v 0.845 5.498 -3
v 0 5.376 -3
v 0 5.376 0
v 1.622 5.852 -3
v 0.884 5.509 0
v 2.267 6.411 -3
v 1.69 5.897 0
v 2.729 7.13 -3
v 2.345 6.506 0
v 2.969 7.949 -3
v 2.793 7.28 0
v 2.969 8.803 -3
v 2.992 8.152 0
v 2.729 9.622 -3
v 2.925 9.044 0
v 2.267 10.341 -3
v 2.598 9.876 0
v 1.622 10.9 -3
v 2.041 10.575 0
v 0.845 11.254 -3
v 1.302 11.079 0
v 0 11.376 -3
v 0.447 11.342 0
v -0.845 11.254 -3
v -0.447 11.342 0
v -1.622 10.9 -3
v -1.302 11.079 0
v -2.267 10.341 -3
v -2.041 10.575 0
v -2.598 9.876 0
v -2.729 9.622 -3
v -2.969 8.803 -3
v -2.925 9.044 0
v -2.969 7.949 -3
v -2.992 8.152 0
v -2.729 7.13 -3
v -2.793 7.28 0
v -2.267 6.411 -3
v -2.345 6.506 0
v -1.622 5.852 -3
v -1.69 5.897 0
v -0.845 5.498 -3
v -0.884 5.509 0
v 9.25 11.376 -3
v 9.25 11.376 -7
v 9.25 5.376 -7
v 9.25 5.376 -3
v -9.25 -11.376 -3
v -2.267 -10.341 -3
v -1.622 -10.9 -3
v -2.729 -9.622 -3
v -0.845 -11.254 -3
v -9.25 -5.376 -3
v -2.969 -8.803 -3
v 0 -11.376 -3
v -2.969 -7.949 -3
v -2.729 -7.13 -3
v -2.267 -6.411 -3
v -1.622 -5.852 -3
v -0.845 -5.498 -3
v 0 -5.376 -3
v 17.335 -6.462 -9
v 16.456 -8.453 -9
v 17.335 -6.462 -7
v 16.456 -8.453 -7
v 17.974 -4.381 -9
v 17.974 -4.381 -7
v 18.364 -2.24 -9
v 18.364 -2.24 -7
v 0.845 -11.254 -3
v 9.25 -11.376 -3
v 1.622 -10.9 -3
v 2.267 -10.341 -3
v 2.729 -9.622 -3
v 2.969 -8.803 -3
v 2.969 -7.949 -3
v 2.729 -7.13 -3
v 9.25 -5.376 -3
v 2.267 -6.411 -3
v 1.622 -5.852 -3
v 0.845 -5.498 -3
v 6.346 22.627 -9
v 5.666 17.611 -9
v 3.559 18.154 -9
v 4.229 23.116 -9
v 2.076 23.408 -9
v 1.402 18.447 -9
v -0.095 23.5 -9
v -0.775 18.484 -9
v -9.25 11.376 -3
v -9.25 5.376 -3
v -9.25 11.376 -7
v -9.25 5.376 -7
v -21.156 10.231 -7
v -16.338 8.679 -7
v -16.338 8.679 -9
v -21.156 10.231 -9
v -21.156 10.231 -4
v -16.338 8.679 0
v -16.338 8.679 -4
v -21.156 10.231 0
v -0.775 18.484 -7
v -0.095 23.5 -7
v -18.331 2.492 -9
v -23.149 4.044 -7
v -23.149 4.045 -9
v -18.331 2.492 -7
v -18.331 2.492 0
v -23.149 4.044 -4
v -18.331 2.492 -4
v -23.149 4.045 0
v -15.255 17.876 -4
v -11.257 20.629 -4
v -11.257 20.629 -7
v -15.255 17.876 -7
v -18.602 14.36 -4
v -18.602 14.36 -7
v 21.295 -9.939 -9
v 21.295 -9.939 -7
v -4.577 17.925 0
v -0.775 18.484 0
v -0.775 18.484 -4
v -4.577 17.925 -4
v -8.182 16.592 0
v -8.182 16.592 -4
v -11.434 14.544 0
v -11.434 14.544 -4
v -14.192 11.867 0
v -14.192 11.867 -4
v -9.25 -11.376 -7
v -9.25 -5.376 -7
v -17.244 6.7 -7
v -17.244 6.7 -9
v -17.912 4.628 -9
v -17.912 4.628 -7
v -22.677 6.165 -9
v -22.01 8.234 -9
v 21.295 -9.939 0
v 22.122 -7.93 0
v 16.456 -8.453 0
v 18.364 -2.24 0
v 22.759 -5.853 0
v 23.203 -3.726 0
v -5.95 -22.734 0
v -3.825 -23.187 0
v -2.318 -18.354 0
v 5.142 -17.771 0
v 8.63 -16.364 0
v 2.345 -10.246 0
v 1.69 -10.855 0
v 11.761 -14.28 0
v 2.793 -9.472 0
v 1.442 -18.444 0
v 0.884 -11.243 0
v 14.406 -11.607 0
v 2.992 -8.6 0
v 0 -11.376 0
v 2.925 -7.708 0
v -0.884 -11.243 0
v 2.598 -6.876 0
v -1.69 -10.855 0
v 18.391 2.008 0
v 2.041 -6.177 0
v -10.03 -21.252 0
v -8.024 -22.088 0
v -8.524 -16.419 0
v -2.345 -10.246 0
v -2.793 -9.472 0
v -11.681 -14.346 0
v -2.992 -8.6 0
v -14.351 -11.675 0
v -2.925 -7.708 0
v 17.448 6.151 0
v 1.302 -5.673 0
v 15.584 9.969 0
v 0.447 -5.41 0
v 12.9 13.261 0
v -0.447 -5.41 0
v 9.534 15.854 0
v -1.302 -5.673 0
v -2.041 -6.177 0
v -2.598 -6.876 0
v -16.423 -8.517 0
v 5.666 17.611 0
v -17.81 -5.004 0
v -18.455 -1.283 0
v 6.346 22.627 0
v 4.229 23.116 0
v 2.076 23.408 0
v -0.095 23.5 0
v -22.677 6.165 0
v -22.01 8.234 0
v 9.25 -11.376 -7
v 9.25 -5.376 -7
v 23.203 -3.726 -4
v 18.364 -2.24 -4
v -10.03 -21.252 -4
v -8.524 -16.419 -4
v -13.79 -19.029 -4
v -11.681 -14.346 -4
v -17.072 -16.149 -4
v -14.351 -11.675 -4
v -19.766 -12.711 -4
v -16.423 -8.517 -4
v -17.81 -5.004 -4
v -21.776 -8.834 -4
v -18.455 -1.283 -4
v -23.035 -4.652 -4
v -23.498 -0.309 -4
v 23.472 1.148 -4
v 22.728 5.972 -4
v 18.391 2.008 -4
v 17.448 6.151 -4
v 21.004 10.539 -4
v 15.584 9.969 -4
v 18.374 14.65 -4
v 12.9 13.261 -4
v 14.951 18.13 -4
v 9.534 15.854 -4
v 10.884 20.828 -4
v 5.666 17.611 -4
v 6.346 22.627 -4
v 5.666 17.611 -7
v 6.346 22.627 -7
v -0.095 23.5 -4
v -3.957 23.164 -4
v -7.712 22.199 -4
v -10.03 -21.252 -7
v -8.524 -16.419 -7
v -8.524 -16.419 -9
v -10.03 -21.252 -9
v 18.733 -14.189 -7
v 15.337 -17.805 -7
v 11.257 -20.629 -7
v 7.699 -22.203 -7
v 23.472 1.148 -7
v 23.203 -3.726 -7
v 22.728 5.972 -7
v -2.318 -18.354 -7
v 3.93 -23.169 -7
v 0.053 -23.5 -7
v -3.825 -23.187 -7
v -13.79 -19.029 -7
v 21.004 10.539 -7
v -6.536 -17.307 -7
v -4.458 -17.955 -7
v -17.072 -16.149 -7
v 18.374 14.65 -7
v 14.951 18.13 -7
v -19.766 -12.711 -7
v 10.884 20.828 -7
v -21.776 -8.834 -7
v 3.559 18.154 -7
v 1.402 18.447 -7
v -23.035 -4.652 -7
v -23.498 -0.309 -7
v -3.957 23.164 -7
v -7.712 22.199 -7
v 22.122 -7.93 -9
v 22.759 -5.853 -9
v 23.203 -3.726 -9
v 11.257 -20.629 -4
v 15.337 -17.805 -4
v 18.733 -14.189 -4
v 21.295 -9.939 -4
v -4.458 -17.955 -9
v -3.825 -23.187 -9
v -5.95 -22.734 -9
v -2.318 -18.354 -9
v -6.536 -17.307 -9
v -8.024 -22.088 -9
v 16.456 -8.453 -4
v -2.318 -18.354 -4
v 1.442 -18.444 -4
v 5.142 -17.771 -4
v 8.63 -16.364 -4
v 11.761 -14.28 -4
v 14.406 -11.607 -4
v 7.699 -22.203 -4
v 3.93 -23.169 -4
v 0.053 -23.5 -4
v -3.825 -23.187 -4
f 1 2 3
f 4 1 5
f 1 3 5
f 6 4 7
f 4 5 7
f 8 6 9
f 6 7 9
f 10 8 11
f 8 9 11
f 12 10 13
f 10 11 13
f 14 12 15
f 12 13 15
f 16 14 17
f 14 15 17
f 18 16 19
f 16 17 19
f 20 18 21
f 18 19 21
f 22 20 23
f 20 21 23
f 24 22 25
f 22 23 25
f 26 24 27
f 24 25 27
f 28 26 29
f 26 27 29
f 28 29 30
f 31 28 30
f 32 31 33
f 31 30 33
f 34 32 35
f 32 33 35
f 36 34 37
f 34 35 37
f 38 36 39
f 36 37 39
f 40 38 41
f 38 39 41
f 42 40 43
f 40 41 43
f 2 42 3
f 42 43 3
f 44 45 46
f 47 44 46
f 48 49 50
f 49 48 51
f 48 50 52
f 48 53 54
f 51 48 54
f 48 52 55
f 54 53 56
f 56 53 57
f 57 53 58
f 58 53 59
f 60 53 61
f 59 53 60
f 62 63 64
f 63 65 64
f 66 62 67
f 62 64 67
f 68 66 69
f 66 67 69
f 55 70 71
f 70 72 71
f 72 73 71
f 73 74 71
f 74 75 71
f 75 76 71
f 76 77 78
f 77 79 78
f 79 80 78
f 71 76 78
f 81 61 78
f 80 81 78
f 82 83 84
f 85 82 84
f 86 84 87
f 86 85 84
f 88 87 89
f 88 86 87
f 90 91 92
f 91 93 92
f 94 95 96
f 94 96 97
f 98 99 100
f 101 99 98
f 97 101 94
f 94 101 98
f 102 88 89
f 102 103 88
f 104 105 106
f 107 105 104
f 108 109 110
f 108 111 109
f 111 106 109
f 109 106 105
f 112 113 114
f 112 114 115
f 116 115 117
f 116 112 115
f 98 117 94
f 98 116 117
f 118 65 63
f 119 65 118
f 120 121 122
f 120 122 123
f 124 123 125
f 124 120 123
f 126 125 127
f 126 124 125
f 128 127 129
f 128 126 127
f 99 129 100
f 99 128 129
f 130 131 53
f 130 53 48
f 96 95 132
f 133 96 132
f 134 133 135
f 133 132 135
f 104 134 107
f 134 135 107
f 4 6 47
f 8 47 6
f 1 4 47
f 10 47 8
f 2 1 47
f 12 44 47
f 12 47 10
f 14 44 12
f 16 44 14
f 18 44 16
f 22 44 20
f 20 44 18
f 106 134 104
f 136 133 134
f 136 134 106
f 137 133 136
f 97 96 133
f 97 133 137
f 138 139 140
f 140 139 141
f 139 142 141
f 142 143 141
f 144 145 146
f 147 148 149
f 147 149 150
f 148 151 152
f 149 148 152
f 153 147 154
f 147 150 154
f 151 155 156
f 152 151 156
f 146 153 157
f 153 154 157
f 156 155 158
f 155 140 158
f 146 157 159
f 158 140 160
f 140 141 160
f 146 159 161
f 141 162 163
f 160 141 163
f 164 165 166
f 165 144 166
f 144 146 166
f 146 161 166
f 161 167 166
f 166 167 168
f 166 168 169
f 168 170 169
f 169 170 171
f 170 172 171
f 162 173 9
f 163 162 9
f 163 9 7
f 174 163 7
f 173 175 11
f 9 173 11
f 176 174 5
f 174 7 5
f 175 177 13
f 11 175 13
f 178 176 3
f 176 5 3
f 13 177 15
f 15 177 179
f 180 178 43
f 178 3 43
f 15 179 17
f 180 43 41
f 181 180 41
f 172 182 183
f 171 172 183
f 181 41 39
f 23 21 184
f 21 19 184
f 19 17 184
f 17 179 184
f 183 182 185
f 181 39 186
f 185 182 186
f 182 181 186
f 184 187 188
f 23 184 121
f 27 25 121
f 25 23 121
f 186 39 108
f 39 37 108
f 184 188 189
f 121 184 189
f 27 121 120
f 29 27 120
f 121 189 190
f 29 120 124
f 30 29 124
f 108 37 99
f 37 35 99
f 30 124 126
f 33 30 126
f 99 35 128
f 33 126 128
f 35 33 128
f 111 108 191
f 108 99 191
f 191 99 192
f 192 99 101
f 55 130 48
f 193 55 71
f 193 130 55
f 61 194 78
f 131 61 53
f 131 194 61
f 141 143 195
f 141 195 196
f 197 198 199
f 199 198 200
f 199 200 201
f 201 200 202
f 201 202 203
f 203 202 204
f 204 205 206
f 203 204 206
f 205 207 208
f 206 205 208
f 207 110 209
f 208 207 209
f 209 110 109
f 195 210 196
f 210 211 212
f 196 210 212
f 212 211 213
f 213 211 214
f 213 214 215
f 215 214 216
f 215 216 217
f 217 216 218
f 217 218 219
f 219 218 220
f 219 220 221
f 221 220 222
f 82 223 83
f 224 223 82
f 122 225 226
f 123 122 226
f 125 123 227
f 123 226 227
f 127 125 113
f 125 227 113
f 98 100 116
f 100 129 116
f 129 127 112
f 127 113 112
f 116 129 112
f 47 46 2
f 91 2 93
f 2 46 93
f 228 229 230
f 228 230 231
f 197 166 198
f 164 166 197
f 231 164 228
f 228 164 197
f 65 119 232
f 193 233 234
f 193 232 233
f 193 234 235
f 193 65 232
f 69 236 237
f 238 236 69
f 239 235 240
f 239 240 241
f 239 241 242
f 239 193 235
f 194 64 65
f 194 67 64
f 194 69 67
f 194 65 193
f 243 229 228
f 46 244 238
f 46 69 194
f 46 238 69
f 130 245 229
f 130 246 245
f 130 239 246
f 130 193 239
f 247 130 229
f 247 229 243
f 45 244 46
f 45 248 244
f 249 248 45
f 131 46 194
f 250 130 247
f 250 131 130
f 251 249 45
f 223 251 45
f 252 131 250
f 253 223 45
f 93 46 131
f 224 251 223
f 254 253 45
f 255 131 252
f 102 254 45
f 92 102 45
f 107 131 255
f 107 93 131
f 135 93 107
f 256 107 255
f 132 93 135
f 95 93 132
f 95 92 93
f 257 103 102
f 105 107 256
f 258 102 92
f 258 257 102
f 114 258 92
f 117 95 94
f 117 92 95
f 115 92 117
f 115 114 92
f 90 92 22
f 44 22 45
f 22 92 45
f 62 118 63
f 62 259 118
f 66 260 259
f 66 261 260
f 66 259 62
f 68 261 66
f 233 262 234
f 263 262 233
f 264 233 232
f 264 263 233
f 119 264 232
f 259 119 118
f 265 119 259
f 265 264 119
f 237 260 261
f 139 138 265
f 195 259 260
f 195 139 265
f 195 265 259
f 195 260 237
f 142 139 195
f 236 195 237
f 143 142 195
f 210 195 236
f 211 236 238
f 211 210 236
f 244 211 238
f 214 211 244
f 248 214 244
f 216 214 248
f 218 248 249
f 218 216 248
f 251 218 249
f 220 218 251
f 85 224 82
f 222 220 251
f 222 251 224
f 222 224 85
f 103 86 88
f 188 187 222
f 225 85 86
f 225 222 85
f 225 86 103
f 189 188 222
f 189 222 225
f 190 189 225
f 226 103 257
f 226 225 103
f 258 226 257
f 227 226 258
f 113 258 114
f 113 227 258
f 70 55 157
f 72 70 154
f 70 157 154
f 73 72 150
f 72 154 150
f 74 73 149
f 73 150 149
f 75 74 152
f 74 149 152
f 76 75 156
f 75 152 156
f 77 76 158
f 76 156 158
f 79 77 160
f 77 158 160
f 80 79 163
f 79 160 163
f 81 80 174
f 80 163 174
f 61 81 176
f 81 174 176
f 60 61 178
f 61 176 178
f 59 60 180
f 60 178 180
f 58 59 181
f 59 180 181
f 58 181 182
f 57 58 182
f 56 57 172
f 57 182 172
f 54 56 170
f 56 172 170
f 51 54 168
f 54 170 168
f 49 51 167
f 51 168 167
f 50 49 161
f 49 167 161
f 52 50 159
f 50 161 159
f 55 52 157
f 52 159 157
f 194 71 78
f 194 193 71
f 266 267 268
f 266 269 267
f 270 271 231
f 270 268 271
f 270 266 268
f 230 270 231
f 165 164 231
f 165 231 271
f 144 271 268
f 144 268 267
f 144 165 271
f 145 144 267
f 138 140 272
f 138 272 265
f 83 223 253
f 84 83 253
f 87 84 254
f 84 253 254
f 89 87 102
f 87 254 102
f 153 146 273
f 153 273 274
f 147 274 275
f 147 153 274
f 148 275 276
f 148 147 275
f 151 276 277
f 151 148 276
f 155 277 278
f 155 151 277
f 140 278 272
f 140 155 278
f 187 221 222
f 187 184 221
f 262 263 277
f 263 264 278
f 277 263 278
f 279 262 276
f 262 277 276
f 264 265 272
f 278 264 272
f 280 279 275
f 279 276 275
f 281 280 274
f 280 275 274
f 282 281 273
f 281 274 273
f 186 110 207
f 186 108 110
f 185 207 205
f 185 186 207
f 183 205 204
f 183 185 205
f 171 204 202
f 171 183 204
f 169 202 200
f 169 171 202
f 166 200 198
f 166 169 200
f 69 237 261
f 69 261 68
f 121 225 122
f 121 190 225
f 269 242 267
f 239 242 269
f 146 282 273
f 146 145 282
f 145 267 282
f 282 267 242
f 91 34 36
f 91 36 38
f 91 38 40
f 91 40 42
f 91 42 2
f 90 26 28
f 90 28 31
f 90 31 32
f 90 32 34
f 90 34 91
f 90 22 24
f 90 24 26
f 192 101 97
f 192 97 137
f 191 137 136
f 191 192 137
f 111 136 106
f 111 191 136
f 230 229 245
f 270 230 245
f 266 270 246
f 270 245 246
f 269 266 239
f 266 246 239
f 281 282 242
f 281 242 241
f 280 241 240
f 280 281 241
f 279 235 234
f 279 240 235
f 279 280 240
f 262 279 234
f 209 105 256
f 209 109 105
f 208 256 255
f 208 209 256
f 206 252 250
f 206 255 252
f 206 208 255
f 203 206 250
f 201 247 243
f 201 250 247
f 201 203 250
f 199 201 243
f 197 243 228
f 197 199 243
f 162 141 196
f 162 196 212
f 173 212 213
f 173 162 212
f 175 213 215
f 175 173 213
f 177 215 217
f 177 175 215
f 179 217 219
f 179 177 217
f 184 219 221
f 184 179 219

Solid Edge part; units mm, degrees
sketch "Sketch1" plane through (0, 0, 0) normal (0, 0, 1) x (1, 0, 0)
  circle A0 centre (0, 0) radius 18.5
extrude "Protrusion1" add sketch "Sketch1" against normal blind 4
sketch "Sketch2" plane through (0, 0, -4) normal (0, 0, -1) x (0, 1, 0)
  circle A0 centre (0, 0) radius 23.5
extrude "Extrusionsausprägung_3" add sketch "Sketch2" along normal blind 3
hole "Bohrung_1" at (0, -8.376, 0) direction (0, 0, -1) diameter 6 end up to next
hole "Hole1" at (0, 8.376, 0) direction (0, 0, -1) diameter 6 end up to next
sketch "Sketch3" plane through (0, 0, -7) normal (0, 0, -1) x (0, -1, 0)
  line L0 (-11.376, 9.25) -> (-11.376, -9.25)
  line L1 (-11.376, -9.25) -> (-5.376, -9.25)
  line L2 (-5.376, -9.25) -> (-5.376, 9.25)
  line L3 (-5.376, 9.25) -> (-11.376, 9.25)
  line L4 (5.376, -9.25) -> (5.376, 9.25)
  line L5 (5.376, 9.25) -> (11.376, 9.25)
  line L6 (11.376, 9.25) -> (11.376, -9.25)
  line L7 (11.376, -9.25) -> (5.376, -9.25)
extrude "Extrusionsausschnitt_2" cut sketch "Sketch3" against normal blind 4
sketch "Sketch4" plane through (0.0615, 0.1775, 0) normal (0, 0, 1) x (0, 1, 0)
  arc A0 (4.0837, 23.8834) -> (10.2705, 21.8899) centre (-0.1775, 0.0615) cw
  line L0 (8.5013, 16.3994) -> (10.2705, 21.8899)
  arc A1 (2.3146, 18.3929) -> (8.5013, 16.3994) centre (-0.1775, 0.0615) cw
  line L1 (4.0837, 23.8834) -> (2.3146, 18.3929)
  arc A2 (-24.0388, 4.0967) -> (-22.104, 10.3021) centre (-0.1775, 0.0615) cw
  line L2 (-16.597, 8.5851) -> (-22.104, 10.3021)
  arc A3 (-18.5317, 2.3797) -> (-16.597, 8.5851) centre (-0.1775, 0.0615) cw
  line L3 (-24.0388, 4.0967) -> (-18.5317, 2.3797)
  arc A4 (-4.1106, -23.8167) -> (-10.3242, -21.9086) centre (-0.1775, 0.0615) cw
  line L4 (-8.6308, -16.3942) -> (-10.3242, -21.9086)
  arc A5 (-2.4172, -18.3024) -> (-8.6308, -16.3942) centre (-0.1775, 0.0615) cw
  line L5 (-4.1106, -23.8167) -> (-2.4172, -18.3024)
  arc A6 (24.0225, 0.0615) -> (23.1495, -6.3796) centre (-0.1775, 0.0615) cw
  line L6 (17.4333, -5.6049) -> (23.1495, -6.3796)
  arc A7 (18.3062, 0.8362) -> (17.4333, -5.6049) centre (-0.1775, 0.0615) cw
  line L7 (24.0225, 0.0615) -> (18.3062, 0.8362)
  dimension "D1" = 48.4
  dimension "D2" = 6.5
  dimension "D3" = 6.5
  dimension "D4" = 6.5
  dimension "D5" = 6.5
  dimension "D6" = 32.36
  dimension "D7" = 29.4
  dimension "D8" = 29.5
  dimension "D9" = 25.7992
extrude "Protrusion2" add sketch "Sketch4" against normal blind 9
sketch "Sketch5" plane through (0.0282, 0.1694, 0) normal (0, 0, 1) x (-0.9518, 0.3067, 0)
  circle A0 centre (-0.0251, 0.1699) radius 30
  circle A1 centre (-0.0251, 0.1699) radius 23.5
extrude "Cutout1" cut sketch "Sketch5" against normal through all
